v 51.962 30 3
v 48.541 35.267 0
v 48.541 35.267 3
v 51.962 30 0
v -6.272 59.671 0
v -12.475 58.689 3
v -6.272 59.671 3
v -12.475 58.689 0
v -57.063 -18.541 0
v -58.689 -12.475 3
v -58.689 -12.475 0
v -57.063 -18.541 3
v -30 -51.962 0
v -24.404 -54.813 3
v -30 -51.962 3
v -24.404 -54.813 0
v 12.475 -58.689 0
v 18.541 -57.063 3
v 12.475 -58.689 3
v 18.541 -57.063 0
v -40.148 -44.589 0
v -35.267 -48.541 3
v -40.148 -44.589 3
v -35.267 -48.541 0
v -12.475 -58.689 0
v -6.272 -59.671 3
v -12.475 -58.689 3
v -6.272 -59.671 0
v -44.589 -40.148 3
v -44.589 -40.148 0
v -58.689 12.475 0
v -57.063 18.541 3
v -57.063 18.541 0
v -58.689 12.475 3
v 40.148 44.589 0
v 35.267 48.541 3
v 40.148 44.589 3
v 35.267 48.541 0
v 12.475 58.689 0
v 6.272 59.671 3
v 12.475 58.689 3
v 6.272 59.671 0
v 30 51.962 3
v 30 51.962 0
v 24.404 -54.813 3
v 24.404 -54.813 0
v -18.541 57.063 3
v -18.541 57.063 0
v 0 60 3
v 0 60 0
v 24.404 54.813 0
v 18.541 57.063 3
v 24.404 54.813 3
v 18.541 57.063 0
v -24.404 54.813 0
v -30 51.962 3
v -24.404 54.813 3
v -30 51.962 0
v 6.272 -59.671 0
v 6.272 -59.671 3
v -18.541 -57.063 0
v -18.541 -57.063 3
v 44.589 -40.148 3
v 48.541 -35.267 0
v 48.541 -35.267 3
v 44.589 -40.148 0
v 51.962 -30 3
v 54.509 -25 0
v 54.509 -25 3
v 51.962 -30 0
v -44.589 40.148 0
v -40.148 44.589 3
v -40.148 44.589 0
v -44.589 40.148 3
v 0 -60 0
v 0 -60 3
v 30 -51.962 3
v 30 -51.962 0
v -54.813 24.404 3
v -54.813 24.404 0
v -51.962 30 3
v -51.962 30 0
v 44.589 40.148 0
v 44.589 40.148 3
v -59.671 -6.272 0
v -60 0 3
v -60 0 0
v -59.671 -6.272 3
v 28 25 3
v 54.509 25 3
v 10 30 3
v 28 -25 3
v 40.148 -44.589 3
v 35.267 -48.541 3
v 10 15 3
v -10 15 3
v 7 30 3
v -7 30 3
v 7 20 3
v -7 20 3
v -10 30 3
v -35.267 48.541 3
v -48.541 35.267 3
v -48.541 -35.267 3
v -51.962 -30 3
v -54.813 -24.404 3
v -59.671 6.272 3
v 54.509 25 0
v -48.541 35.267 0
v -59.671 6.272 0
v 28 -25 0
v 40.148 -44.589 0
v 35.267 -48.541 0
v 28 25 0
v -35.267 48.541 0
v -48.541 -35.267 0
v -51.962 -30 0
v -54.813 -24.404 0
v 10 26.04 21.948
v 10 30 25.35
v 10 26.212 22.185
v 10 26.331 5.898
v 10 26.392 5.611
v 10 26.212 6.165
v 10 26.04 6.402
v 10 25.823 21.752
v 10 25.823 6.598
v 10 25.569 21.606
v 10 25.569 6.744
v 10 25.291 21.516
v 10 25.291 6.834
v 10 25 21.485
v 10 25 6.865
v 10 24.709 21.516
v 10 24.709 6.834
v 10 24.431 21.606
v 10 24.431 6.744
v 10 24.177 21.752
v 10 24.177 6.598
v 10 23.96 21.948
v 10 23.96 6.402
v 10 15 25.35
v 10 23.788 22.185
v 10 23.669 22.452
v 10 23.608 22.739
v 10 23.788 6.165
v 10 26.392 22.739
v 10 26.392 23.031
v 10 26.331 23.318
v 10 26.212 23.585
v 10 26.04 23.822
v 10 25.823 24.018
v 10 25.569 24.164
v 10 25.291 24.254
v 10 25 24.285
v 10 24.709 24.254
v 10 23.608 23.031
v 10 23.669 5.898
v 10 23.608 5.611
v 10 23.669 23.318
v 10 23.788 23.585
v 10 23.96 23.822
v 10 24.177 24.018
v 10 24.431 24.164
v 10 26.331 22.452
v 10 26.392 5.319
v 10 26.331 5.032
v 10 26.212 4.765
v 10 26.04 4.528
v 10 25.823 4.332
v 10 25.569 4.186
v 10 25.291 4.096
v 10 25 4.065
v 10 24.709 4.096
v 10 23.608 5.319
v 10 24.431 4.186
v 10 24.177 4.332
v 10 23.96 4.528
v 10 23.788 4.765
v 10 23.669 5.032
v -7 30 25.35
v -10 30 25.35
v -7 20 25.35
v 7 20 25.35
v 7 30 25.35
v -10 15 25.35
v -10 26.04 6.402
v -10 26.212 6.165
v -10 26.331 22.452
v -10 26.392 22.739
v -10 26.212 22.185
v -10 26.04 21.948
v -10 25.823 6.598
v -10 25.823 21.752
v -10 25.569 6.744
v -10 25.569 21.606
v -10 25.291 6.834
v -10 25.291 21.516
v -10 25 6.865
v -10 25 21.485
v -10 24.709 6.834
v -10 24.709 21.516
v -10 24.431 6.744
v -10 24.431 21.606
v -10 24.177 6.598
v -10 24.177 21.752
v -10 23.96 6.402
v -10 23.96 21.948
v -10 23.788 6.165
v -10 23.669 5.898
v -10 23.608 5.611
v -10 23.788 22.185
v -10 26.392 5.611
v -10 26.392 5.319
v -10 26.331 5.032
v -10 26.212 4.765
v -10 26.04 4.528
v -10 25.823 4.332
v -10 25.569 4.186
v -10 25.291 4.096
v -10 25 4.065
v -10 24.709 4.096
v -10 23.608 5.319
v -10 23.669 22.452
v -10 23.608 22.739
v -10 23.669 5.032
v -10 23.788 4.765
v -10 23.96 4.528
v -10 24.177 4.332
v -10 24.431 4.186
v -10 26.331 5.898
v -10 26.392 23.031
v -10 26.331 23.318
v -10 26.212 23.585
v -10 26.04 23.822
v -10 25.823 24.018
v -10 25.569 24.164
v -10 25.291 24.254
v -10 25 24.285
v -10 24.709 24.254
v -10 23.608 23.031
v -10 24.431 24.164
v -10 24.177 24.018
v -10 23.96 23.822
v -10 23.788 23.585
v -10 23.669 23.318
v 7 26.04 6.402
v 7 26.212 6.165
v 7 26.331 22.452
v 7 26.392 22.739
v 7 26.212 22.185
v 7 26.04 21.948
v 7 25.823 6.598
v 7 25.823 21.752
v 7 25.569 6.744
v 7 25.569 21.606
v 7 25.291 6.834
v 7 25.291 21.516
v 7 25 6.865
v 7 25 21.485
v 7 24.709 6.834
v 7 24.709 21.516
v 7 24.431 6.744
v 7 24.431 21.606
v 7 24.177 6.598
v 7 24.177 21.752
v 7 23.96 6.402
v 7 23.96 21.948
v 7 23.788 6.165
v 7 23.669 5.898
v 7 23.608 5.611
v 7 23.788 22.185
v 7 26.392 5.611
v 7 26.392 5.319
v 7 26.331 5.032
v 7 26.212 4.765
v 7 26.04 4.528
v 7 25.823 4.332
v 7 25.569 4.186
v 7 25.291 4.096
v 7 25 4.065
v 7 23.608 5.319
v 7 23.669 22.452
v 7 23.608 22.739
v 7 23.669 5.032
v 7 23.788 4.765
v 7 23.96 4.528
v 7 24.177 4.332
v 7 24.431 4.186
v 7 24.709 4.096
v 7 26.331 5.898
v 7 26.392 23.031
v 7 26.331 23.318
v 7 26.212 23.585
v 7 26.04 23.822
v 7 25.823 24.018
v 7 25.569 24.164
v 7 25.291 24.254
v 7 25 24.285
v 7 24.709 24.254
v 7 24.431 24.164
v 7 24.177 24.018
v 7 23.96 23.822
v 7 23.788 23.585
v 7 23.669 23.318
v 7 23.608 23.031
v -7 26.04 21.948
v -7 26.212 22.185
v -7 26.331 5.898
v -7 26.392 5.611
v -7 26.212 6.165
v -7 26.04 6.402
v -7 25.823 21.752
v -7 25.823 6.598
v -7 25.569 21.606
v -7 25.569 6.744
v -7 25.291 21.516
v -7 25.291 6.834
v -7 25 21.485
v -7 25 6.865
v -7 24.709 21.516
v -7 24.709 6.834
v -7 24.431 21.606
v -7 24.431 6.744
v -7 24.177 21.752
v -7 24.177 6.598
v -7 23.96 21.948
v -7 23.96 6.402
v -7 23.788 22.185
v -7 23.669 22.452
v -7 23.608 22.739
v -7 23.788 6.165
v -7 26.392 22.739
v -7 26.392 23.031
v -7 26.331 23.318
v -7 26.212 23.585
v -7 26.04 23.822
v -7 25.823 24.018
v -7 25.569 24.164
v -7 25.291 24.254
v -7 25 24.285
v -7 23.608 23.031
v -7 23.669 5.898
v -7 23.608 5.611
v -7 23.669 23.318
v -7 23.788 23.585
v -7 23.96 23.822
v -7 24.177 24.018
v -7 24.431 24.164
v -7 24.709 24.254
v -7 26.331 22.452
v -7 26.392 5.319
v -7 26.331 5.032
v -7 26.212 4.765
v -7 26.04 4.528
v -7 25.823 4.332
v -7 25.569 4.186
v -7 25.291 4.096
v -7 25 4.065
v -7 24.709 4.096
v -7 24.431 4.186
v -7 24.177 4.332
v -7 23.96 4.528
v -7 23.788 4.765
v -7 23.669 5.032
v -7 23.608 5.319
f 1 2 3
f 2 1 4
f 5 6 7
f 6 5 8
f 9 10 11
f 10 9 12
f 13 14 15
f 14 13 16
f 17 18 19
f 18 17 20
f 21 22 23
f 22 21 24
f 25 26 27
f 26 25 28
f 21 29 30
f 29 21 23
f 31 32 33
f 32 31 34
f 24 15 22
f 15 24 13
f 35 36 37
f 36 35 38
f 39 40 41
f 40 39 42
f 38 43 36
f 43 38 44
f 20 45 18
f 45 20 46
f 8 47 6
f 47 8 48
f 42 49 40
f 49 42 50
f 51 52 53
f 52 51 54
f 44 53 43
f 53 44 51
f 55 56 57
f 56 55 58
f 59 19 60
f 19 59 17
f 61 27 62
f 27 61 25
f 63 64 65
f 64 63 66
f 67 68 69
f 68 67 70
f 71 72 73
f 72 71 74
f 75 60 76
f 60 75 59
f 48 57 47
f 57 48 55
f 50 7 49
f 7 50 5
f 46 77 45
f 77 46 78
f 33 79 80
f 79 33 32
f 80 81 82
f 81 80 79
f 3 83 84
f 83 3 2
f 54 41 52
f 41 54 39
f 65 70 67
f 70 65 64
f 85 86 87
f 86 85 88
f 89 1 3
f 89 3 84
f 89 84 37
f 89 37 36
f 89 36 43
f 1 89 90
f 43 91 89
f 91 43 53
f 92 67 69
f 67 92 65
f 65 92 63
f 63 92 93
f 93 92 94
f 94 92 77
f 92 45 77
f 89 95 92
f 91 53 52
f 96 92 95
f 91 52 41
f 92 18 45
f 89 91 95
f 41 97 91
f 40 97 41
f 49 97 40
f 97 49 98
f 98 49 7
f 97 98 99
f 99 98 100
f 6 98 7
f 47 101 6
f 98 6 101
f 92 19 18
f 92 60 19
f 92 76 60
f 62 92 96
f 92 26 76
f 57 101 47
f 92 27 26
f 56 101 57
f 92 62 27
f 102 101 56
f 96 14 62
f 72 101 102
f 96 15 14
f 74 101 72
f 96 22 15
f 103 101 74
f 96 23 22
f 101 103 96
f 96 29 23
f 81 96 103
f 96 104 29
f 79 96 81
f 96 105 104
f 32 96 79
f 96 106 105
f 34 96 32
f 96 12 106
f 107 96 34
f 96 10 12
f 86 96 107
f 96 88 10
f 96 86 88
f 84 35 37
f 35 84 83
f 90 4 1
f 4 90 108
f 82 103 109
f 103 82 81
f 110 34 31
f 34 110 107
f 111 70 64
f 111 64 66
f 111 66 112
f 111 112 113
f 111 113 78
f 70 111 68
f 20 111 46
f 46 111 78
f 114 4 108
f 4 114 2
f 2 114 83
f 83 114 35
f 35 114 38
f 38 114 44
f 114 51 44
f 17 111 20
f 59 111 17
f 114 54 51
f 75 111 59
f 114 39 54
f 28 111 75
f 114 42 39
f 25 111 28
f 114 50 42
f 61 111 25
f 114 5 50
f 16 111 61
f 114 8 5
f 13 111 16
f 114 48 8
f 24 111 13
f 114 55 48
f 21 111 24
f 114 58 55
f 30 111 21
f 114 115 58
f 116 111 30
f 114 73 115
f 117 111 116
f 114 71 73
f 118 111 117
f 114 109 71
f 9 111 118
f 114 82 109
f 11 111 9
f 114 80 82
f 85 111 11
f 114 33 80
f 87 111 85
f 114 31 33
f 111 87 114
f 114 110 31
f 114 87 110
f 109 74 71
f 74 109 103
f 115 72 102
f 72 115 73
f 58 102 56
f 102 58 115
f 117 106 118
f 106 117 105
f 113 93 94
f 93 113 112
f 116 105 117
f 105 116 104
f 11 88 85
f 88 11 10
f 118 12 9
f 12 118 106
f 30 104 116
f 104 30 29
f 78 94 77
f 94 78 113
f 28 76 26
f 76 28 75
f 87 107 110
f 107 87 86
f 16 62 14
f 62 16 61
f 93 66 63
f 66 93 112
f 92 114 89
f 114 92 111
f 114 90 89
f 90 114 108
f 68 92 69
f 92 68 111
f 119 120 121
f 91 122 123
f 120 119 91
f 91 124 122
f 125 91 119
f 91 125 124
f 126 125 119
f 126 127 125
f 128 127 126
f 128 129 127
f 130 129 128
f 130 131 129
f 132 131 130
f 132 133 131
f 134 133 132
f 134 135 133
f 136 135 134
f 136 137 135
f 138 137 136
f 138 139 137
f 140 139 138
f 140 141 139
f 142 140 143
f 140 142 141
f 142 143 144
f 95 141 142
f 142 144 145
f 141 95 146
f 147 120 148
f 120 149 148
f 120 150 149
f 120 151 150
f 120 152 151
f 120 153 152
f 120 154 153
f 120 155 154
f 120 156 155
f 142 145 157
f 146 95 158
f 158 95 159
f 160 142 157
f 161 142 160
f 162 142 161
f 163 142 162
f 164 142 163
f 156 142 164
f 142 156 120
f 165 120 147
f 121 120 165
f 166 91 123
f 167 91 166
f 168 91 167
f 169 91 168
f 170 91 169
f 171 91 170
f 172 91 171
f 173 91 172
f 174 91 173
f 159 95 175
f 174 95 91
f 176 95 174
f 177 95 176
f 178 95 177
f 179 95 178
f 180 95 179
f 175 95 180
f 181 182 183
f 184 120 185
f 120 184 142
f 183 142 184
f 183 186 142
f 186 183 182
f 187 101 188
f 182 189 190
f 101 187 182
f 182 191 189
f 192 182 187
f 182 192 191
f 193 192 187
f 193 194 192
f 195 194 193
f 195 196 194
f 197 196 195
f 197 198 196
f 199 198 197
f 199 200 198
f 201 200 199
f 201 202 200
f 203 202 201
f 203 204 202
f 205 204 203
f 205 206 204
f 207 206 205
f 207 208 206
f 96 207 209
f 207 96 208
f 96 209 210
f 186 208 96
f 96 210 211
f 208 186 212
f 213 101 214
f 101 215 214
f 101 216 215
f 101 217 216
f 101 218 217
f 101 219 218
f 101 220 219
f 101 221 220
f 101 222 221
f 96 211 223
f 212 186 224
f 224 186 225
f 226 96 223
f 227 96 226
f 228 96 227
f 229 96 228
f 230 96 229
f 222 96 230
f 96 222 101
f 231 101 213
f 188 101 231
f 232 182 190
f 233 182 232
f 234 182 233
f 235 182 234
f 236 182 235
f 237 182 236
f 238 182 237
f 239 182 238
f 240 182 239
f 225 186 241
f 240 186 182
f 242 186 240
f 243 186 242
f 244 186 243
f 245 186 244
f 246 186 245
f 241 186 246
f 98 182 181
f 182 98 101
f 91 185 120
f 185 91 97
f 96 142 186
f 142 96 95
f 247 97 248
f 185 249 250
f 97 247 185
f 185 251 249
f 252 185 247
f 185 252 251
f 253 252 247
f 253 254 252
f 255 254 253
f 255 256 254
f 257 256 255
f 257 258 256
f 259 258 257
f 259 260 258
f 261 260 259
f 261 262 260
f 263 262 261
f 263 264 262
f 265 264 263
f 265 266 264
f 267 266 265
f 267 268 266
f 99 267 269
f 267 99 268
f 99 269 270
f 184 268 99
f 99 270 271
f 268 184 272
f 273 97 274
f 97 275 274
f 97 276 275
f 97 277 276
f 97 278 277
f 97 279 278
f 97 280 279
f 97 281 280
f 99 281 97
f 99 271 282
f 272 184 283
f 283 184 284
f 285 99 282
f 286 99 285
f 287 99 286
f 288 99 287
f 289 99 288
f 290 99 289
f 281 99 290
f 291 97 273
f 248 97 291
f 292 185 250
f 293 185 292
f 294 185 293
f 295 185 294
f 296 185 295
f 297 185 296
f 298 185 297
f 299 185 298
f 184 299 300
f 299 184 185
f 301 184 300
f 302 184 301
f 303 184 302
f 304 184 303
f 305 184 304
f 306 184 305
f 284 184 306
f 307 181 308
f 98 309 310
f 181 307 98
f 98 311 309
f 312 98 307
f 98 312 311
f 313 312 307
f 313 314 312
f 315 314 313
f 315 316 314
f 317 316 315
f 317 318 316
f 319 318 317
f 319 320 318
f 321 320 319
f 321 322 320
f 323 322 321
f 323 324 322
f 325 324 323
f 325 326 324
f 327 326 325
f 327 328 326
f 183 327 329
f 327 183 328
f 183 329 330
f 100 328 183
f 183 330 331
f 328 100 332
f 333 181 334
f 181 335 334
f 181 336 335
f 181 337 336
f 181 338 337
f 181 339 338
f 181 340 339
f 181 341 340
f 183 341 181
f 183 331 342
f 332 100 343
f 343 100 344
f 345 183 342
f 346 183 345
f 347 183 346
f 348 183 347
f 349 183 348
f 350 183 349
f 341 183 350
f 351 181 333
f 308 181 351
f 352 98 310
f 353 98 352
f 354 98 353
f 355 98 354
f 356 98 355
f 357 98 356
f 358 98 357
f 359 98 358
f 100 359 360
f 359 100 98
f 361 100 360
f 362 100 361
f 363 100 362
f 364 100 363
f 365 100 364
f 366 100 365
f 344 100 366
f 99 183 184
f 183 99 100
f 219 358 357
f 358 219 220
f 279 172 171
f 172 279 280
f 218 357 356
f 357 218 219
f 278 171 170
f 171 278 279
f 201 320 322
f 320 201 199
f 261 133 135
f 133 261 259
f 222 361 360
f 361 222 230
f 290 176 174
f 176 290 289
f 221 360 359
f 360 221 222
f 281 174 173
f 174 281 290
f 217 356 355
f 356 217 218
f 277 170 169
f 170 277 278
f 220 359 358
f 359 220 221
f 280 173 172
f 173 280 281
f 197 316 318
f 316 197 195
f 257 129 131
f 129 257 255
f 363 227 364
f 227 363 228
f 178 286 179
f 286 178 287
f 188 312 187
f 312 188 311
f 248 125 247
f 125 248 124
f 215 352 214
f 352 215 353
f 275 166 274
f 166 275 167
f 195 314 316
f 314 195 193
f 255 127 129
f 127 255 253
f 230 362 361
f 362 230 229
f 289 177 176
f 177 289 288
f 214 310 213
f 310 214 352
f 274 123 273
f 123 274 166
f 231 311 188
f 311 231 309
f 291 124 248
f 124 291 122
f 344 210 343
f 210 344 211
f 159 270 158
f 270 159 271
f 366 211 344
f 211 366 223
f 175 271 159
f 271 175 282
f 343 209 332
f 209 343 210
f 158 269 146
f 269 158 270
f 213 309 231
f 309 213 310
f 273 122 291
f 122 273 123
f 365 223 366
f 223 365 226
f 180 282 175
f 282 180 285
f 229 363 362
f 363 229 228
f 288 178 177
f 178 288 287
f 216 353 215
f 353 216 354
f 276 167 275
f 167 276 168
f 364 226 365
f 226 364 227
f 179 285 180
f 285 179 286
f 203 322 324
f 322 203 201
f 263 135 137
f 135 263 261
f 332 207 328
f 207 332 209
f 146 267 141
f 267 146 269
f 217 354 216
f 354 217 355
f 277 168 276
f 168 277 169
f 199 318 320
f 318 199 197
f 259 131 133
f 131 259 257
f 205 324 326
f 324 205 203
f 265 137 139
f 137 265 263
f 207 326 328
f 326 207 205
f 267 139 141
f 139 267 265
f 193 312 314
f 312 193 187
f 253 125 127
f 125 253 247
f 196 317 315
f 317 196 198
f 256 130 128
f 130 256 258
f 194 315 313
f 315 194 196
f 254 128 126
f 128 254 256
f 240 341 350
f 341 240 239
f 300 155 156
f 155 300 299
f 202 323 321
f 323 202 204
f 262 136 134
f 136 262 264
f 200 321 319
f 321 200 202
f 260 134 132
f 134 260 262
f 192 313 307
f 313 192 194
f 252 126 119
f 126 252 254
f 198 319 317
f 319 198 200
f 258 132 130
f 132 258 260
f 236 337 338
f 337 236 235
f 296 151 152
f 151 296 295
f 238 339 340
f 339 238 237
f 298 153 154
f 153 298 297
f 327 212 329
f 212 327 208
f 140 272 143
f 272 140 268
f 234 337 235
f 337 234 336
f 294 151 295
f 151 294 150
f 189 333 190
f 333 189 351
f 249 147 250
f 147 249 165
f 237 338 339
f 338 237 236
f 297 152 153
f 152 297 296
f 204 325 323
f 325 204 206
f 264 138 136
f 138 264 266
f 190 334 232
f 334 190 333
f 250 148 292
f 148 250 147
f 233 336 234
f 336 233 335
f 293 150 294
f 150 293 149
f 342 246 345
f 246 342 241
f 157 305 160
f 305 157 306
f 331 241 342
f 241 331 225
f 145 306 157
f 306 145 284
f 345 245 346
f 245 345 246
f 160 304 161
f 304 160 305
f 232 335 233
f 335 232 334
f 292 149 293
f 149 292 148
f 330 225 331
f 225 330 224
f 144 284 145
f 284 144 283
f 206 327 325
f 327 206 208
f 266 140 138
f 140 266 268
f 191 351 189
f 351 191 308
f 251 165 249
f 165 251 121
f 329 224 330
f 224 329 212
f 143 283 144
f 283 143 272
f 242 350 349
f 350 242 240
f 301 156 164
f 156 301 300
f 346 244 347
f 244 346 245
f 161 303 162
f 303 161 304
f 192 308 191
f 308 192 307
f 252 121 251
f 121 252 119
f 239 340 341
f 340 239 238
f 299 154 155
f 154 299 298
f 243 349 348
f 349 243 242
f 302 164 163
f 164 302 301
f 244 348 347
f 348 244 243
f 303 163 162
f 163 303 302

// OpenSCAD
$fn=60;

   
difference(){
cylinder(d=120,h=3);
translate([28,-25,0])cube(50);    
}

difference(){
translate([-10,15,3])cube([20,15,22.35]);
translate([-7,20,-10])cube([14,11,50]);
translate([0,25,5.465])rotate([0,90,0])
cylinder(d=2.8,h=50,center=true,$fn=30);
translate([0,25,22.885])rotate([0,90,0])
cylinder(d=2.8,h=50,center=true,$fn=30);
}
